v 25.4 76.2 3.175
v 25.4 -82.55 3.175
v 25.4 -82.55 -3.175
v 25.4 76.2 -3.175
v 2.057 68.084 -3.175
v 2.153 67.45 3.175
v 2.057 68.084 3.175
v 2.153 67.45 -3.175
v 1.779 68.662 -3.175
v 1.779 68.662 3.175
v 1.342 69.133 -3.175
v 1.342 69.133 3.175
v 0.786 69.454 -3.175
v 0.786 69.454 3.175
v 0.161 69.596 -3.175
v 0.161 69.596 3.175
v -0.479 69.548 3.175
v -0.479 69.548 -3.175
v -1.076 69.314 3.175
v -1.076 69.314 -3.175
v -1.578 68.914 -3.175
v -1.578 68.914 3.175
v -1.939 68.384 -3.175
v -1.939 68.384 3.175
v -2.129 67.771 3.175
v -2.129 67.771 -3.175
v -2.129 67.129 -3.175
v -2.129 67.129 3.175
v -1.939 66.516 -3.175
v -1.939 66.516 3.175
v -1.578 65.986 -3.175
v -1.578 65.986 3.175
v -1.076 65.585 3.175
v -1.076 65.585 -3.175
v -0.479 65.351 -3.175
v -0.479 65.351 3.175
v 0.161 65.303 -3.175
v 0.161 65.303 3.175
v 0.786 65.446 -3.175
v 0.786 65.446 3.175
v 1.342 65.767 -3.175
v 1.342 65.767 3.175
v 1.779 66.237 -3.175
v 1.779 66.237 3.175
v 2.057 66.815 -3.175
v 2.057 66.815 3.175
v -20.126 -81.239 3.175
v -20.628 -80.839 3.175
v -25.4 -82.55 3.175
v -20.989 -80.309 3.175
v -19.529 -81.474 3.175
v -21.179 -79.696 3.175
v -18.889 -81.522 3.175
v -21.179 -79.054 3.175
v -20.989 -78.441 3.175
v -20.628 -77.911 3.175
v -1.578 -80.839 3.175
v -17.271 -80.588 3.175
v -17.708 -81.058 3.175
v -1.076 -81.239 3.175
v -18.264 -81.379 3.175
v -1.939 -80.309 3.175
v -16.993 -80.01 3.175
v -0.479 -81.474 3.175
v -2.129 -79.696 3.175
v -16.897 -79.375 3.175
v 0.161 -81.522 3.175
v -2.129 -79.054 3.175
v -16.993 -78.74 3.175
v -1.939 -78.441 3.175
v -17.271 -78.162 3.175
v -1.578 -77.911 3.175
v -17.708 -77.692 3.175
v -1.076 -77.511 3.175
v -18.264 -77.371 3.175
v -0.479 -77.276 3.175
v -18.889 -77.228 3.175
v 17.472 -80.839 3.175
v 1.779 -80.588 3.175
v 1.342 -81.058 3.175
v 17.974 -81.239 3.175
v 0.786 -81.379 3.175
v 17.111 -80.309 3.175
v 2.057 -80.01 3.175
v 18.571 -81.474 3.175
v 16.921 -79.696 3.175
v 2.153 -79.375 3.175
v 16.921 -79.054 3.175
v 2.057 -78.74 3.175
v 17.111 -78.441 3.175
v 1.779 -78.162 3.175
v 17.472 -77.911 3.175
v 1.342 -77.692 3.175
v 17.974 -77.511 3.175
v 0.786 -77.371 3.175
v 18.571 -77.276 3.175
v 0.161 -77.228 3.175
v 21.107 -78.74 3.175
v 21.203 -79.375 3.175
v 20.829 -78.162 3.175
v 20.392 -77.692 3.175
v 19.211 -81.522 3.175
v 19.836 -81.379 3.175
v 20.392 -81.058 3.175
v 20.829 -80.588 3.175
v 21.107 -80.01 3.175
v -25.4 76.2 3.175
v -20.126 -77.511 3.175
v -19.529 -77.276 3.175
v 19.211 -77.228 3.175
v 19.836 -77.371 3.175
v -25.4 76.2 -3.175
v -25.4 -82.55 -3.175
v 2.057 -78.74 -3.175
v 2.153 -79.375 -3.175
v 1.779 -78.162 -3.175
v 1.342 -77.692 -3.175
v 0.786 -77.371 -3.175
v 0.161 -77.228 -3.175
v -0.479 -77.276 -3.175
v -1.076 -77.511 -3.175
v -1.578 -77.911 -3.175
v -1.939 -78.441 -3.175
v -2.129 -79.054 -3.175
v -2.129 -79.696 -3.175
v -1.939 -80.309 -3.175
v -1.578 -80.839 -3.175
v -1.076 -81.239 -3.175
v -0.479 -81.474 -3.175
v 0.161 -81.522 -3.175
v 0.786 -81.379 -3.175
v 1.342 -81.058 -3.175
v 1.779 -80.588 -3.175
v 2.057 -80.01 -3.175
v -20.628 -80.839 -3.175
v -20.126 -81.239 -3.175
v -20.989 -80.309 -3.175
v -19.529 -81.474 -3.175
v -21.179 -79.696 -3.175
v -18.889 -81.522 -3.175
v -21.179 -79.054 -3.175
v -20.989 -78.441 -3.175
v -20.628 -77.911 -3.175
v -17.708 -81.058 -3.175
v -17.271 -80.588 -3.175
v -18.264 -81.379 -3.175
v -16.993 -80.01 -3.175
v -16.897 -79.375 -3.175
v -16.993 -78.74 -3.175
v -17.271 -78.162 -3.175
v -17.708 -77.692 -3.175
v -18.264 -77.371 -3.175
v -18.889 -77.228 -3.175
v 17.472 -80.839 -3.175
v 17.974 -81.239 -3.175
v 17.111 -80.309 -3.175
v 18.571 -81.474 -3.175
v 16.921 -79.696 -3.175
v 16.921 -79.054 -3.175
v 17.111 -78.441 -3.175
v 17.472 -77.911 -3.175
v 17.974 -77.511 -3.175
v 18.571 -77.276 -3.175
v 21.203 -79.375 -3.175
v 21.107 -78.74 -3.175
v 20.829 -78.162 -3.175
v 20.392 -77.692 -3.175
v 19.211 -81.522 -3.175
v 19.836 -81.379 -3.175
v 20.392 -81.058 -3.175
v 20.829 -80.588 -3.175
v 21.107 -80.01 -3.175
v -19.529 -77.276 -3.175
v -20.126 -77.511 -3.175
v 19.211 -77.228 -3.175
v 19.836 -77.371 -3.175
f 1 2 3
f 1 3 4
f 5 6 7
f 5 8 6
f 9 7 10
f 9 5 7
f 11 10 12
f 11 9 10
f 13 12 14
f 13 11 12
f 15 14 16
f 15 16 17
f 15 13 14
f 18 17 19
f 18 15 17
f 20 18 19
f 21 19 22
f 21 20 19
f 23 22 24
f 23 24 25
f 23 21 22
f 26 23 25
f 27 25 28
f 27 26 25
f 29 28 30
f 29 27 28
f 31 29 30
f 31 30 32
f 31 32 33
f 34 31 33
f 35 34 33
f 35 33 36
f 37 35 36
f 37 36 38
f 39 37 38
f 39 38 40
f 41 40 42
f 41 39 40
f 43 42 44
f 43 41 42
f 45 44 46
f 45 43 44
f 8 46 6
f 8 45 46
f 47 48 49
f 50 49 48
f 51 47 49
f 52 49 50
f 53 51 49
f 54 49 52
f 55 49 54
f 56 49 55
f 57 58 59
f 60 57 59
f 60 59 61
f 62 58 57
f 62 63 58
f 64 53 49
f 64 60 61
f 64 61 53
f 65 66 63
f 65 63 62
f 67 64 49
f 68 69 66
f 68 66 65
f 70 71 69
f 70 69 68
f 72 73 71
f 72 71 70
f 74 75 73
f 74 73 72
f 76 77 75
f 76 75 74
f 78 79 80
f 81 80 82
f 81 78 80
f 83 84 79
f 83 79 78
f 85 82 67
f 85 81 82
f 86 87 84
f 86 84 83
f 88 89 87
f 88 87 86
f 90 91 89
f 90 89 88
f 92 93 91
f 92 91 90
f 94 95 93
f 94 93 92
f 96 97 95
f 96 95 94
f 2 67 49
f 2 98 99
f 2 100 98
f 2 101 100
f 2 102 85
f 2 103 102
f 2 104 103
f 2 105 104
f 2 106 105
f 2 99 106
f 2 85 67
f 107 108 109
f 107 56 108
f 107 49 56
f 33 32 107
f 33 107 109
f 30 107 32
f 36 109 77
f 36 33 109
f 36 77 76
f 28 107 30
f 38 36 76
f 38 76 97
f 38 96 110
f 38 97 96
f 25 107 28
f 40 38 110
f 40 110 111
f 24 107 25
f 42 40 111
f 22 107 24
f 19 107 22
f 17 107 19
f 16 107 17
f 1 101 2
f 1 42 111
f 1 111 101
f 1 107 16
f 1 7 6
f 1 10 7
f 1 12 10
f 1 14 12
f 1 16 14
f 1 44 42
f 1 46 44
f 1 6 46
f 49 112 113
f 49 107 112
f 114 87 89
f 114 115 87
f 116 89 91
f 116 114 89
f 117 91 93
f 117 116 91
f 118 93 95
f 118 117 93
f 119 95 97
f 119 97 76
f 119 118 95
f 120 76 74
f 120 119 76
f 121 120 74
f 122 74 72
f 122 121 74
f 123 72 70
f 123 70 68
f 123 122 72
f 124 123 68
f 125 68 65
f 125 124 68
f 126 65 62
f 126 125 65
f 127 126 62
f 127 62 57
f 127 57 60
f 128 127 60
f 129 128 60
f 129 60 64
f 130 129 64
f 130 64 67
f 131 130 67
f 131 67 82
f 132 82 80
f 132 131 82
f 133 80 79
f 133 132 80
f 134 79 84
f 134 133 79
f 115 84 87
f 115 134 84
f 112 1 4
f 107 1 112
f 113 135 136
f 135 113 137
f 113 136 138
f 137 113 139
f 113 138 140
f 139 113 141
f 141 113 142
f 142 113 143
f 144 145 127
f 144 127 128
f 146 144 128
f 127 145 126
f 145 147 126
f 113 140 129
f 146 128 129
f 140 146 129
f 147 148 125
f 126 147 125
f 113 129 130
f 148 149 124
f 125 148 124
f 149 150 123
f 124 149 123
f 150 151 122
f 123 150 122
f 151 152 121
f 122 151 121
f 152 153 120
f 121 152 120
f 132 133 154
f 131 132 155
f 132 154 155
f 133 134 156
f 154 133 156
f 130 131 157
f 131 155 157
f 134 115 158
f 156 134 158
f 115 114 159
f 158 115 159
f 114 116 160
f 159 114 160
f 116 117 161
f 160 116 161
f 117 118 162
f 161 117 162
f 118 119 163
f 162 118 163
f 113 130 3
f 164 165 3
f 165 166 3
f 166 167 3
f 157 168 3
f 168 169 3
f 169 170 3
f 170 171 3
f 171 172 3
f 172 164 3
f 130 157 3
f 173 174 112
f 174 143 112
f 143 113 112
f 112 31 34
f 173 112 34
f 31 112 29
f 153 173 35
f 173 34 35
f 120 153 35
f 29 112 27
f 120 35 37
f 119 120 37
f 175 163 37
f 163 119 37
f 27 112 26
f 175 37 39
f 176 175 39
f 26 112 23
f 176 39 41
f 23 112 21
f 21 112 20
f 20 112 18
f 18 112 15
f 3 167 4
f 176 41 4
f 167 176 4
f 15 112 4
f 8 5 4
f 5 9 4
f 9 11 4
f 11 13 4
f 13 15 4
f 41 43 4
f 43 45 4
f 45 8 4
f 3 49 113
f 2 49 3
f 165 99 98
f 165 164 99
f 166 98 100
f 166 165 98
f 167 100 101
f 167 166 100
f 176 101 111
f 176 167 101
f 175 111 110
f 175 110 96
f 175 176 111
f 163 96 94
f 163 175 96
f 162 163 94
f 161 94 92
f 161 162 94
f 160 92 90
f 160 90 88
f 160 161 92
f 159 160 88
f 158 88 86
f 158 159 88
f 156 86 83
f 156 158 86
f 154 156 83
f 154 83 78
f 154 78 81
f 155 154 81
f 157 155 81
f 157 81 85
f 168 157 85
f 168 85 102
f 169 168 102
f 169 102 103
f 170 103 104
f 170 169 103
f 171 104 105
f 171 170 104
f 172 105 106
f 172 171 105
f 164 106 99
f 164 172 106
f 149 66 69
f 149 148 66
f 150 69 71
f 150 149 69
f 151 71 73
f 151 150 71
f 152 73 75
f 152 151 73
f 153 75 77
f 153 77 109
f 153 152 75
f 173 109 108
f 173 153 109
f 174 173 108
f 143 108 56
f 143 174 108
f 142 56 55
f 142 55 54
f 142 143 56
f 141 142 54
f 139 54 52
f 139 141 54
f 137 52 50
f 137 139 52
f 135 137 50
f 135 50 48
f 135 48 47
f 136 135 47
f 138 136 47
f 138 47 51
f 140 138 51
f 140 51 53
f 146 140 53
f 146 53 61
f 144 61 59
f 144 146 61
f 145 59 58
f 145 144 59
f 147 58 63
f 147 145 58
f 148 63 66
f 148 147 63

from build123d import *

# Parameters (mm, degrees)
SKETCH1_R           = 2.15265
BOSS_EXTRUDE1_DEPTH = 3.175


with BuildPart() as part:
    # Sketch1 → Boss-Extrude1 (new, symmetric)
    with BuildSketch(Plane.XY):
        Polygon((-25.4, -76.2), (-25.4, -82.55), (25.4, -82.55), (25.4, -76.2), (25.4, 76.2), (-25.4, 76.2), align=None)
        with Locations((0, 67.4497)):
            Circle(SKETCH1_R, mode=Mode.SUBTRACT)
        with Locations((-19.05, -79.375)):
            Circle(SKETCH1_R, mode=Mode.SUBTRACT)
        with Locations((0, -79.375)):
            Circle(SKETCH1_R, mode=Mode.SUBTRACT)
        with Locations((19.05, -79.375)):
            Circle(SKETCH1_R, mode=Mode.SUBTRACT)
    extrude(amount=BOSS_EXTRUDE1_DEPTH, both=True)


solid = part.part
